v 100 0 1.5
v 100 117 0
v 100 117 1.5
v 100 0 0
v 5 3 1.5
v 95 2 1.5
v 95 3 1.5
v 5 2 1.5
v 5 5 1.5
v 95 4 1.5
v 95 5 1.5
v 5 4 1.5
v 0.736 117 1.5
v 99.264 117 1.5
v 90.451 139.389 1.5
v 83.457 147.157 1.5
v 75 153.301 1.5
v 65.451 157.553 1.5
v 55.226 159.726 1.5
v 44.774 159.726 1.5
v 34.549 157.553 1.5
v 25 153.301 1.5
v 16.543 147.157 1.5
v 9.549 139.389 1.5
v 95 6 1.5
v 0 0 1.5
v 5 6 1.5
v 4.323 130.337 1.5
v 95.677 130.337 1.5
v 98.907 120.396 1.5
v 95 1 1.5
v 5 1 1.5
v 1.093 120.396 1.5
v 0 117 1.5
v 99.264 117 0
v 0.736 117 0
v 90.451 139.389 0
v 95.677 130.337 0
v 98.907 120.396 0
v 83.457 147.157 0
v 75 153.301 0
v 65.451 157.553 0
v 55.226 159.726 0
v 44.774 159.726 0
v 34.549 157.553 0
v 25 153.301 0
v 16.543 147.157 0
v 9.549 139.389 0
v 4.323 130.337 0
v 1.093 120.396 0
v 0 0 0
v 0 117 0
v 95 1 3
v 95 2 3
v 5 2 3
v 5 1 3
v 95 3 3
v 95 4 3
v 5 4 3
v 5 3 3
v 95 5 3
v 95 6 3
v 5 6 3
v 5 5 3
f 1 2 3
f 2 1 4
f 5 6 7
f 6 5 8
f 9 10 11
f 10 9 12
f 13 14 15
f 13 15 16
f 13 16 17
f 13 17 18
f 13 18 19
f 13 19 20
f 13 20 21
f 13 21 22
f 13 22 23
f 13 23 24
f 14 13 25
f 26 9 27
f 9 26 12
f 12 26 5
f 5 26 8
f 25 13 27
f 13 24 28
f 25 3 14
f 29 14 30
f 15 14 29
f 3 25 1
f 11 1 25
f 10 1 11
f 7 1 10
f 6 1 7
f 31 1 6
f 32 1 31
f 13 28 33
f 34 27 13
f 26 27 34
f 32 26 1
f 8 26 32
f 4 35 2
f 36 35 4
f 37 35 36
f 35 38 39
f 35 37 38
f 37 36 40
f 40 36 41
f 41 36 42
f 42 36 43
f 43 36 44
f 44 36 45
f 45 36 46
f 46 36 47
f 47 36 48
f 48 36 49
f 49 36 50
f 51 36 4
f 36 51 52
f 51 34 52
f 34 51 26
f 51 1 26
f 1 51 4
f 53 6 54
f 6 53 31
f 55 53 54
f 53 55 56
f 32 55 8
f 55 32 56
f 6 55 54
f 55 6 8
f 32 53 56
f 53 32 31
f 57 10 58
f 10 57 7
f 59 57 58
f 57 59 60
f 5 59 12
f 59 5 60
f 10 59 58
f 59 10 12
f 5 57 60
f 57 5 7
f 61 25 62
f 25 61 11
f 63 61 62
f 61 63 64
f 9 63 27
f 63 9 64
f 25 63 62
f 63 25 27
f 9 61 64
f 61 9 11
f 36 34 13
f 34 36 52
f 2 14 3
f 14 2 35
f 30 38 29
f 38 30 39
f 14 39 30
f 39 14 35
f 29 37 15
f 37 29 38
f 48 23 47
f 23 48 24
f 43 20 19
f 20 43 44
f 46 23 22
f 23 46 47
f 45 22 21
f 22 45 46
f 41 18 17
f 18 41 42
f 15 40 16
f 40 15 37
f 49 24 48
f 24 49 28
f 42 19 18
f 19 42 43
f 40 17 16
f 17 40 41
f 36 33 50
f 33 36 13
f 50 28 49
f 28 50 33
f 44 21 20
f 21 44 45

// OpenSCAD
//zipper strip (with 3 sections)
cube(size=[100,7,1.5]); //x=100mm so that 5mm on each side of it can 
				//be fused together, so the opening is only 90mm
	//1
translate([5,1,1.5]) cube(size=[90,1,1.5]);
	//2
translate([5,3,1.5]) cube(size=[90,1,1.5]);
	//3
translate([5,5,1.5]) cube(size=[90,1,1.5]);

//body
translate([0,7,0]) cube(size=[100,110,1.5]);
translate([50,110,0]) cylinder(h=1.5, r=50);
